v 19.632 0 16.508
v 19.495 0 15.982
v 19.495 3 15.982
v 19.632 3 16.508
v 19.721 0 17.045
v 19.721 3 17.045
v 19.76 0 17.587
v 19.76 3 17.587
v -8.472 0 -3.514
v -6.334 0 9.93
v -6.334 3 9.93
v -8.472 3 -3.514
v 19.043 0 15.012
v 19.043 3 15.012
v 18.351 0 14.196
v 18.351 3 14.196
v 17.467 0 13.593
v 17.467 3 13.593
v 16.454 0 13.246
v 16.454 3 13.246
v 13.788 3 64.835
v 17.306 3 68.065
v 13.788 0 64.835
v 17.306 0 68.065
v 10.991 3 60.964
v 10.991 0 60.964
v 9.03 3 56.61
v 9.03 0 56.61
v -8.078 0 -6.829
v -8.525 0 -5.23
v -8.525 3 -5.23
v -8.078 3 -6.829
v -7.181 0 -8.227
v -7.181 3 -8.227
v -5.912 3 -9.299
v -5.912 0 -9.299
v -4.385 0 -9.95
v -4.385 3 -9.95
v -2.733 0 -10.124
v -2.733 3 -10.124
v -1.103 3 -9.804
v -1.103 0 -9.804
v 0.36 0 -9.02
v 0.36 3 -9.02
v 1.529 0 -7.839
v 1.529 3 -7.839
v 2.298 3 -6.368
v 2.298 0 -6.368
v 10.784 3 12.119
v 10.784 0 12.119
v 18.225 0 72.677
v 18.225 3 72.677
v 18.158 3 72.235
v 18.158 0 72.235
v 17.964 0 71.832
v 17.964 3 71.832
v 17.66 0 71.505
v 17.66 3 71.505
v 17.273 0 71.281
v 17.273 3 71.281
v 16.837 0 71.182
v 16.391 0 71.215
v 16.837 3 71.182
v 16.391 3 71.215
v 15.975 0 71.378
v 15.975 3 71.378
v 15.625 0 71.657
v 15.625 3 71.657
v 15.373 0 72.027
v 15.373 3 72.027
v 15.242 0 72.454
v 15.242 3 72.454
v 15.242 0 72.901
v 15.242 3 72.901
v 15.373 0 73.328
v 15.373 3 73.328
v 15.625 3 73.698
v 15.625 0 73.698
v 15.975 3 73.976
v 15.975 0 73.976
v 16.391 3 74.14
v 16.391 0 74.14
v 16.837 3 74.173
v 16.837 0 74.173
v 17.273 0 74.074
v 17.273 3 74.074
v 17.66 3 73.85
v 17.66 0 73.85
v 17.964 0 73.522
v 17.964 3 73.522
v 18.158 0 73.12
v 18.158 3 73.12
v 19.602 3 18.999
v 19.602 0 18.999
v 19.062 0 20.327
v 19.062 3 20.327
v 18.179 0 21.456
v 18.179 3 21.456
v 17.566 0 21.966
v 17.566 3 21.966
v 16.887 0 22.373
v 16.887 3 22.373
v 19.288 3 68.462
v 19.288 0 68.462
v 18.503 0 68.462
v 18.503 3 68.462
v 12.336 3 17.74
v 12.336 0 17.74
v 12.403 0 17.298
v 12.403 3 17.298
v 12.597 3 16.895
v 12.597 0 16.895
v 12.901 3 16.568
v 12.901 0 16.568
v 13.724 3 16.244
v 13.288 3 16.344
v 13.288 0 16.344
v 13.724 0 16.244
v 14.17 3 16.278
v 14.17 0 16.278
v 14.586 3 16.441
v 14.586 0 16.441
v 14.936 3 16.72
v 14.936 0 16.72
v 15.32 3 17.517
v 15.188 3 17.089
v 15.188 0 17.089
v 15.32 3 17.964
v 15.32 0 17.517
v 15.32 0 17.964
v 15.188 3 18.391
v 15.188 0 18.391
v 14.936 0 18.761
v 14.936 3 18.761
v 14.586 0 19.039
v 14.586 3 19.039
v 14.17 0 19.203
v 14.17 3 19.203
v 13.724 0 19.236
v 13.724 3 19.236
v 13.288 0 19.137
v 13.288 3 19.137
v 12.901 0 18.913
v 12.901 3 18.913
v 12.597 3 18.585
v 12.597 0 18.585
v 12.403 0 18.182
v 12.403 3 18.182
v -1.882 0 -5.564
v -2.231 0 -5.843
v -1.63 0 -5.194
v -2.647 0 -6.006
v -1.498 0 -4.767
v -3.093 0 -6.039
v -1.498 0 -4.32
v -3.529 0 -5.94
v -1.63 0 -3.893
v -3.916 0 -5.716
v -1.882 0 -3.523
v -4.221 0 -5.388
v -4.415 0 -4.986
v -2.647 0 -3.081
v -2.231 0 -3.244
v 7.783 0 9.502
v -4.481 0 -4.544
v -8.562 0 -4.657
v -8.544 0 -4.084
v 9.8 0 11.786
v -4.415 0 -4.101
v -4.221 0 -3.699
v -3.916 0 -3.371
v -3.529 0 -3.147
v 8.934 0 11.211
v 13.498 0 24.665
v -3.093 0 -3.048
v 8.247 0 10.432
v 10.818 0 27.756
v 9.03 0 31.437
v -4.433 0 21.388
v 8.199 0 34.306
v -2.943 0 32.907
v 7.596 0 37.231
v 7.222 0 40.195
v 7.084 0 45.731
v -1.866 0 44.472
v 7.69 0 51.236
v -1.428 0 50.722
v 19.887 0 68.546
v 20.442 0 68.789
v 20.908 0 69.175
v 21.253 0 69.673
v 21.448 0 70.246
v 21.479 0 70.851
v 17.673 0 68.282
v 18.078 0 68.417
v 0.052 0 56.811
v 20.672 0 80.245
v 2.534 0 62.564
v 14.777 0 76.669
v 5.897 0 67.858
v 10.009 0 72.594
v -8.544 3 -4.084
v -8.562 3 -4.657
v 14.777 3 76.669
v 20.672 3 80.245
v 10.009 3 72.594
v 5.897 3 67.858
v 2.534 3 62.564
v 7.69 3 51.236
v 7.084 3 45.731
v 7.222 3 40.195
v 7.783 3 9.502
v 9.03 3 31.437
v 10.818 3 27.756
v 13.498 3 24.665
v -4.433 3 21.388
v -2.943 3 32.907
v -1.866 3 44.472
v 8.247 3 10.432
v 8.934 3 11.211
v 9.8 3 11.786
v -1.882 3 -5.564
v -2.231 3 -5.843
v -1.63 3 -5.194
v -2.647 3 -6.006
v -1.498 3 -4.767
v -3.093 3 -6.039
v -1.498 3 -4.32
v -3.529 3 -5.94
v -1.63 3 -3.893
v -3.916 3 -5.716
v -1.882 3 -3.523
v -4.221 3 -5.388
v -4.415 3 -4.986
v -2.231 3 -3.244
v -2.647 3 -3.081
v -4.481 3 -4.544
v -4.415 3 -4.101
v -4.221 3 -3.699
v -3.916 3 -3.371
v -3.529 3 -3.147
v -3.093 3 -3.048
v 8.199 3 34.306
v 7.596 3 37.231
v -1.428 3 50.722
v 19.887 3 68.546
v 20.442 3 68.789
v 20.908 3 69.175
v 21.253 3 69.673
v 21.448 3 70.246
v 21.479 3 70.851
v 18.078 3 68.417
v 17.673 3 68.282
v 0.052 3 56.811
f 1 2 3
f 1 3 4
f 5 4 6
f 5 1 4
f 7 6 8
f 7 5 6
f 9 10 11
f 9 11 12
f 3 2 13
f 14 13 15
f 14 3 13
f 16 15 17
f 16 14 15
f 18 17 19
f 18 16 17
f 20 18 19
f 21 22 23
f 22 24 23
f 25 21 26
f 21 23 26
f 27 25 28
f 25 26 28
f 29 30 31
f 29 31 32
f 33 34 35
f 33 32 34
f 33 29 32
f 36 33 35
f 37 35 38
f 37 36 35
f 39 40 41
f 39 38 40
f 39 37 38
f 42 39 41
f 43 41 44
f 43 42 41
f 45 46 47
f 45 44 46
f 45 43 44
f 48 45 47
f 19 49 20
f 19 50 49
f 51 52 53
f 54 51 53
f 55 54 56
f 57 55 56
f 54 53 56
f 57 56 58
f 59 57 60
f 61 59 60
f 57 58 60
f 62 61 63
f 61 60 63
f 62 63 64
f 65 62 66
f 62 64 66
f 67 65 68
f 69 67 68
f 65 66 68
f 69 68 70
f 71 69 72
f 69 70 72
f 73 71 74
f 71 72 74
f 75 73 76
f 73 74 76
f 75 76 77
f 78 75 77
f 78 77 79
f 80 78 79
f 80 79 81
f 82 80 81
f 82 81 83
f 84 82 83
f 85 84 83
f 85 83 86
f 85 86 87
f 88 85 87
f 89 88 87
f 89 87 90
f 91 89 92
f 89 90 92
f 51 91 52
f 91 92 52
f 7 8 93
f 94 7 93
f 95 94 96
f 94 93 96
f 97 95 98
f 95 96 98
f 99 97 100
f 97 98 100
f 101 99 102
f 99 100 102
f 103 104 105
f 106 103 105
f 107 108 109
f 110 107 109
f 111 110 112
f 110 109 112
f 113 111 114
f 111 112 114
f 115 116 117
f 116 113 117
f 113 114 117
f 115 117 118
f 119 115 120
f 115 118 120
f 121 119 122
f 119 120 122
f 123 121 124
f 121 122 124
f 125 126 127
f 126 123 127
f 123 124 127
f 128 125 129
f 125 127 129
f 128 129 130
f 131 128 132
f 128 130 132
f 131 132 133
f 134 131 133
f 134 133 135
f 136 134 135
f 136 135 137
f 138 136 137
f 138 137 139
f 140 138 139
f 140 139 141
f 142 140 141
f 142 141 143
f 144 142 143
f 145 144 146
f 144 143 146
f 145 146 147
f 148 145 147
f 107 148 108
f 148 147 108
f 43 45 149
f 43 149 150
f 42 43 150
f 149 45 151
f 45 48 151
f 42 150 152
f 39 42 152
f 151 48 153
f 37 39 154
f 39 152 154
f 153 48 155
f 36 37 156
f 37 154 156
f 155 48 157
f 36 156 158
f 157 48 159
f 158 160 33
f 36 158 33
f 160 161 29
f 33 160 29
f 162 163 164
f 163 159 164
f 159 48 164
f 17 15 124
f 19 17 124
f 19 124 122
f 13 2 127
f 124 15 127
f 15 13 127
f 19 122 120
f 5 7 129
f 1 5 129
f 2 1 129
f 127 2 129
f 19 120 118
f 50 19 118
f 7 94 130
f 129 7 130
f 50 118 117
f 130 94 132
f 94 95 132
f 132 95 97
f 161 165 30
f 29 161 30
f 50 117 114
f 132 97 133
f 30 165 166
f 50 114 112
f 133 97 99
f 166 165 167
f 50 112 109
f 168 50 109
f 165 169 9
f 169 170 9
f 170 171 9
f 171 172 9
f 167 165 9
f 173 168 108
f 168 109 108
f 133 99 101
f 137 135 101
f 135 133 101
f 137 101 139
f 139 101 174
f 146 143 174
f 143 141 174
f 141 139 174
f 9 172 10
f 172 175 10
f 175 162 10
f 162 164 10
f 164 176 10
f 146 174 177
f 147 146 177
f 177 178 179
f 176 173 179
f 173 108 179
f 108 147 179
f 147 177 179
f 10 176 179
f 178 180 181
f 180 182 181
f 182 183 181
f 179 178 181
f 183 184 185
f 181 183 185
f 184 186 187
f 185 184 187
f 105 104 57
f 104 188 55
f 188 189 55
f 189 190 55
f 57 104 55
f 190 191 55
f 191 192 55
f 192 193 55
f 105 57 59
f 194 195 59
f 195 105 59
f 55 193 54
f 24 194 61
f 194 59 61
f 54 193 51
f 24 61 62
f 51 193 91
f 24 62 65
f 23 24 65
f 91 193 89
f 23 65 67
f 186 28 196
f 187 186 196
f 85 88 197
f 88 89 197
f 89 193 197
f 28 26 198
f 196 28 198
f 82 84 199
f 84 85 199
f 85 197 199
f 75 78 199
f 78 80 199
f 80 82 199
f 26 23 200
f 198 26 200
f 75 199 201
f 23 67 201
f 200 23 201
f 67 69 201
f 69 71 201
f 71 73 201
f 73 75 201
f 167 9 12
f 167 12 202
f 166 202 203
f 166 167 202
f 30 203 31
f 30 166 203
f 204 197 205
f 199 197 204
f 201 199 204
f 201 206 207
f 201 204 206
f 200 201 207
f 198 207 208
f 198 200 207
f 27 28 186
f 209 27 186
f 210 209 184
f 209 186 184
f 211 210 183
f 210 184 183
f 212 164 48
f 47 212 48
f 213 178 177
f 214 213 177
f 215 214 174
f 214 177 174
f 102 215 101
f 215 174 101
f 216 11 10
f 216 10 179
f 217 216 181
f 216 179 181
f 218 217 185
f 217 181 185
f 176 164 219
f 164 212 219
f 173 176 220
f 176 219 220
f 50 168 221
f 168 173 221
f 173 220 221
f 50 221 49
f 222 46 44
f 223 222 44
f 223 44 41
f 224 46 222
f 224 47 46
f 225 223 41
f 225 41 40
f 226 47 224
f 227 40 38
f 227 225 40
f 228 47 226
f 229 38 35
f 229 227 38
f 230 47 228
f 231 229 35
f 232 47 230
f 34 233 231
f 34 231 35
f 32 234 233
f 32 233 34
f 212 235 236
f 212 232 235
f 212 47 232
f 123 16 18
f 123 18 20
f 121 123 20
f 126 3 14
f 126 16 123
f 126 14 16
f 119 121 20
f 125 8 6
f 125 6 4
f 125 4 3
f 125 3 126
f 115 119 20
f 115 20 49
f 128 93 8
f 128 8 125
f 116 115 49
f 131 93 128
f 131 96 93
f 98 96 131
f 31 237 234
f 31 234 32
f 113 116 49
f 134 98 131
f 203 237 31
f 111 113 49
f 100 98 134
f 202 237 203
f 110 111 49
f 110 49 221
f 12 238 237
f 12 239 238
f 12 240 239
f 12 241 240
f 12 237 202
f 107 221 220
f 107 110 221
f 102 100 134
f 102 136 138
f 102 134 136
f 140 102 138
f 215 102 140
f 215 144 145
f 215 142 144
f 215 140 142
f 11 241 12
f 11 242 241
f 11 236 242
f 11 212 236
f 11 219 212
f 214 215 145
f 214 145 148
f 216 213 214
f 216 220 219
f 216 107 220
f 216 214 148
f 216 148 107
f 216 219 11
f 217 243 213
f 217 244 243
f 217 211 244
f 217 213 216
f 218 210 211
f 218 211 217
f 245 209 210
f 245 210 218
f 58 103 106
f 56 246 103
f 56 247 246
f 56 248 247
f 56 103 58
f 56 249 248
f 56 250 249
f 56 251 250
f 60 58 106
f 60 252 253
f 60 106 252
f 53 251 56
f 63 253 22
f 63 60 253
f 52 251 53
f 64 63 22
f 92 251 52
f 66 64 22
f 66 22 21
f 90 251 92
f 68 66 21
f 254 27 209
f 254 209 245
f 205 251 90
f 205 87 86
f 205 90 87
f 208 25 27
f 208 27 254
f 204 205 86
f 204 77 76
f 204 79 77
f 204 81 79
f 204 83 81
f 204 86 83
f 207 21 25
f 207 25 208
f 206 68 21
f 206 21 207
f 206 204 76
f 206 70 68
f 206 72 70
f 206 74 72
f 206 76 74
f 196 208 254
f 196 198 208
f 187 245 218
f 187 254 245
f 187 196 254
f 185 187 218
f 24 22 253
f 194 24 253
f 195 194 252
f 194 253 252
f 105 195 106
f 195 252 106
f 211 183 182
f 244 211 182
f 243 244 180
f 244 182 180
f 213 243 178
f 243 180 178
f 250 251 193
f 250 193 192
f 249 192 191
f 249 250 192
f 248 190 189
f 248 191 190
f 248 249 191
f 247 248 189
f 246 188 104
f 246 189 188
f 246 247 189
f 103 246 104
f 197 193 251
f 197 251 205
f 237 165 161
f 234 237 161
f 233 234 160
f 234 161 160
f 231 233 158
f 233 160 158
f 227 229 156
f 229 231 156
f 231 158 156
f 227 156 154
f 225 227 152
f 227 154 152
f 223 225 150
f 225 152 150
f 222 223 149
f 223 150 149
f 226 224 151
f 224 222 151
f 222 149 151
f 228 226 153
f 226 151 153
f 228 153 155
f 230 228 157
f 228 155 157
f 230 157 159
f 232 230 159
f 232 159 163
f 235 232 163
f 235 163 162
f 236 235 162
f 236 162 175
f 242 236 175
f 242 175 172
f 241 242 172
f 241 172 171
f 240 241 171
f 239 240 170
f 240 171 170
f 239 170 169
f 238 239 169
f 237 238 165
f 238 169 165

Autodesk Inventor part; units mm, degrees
ref_plane "YZ Plane" through (0, 0, 0) normal (1, 0, 0) x (0, 1, 0)
ref_plane "XZ Plane" through (0, 0, 0) normal (0, 1, 0) x (-1, 0, 0)
ref_plane "XY Plane" through (0, 0, 0) normal (0, 0, 1) x (1, 0, 0)
sketch "Sketch4" plane through (0, 0, 0) normal (0, 1, 0) x (-1, 0, 0)
  arc A0 (8.5248, -5.2299) -> (8.4715, -3.5145) centre (2.5627, -4.5564) ccw
  circle A1 centre (-13.8365, 17.7403) radius 1.5
  circle A2 centre (2.9812, -4.5435) radius 1.5
  arc A3 (-18.1395, 21.8135) -> (-18.0355, 13.56) centre (-13.8365, 17.7403) ccw
  arc A4 (-9.0304, 31.4366) -> (-7.2225, 40.1949) centre (-45.2058, 43.4695) ccw
  arc A5 (-18.1395, 21.8135) -> (-9.0304, 31.4366) centre (-23.8893, 36.3791) ccw
  line L0 (6.3335, 9.9302) -> (8.4977, -3.6654)
  circle A6 centre (-16.5155, 72.4101) radius 3.2
  line L1 (-20.6719, 80.2448) -> (-14.7774, 76.6686)
  arc A7 (-2.5338, 62.5638) -> (-14.7774, 76.6686) centre (-39.7178, 42.6529) ccw
  arc A8 (1.8655, 44.4721) -> (-2.5338, 62.5638) centre (-35.3105, 45.0128) ccw
  arc A9 (1.8655, 44.4721) -> (6.3335, 9.9302) centre (325.703, 68.8005) ccw
  line L2 (-21.6848, 68.4625) -> (-20.6719, 80.2448)
  line L3 (-18.8545, 68.4625) -> (-21.6848, 68.4625)
  line L4 (-18.8545, 68.4625) -> (-17.8545, 68.4625)
  arc A10 (-9.0296, 56.61) -> (-17.8545, 68.4625) centre (-31.443, 49.1333) ccw
  arc A11 (-7.2225, 40.1949) -> (-9.0296, 56.61) centre (-48.1916, 43.9919) ccw
  line L5 (-8.5324, 11.672) -> (-2.2983, -6.3679)
  line L6 (-8.5324, 11.672) -> (-18.0355, 13.56)
  arc A12 (8.4977, -3.6654) -> (8.4715, -3.5145) centre (2.9812, -4.5435) ccw
  arc A13 (-2.2983, -6.3679) -> (8.5248, -5.2299) centre (2.9812, -4.5435) ccw
  arc A14 (8.4977, -3.6654) -> (8.4715, -3.5145) centre (2.9812, -4.5435) ccw
  point P0 (0, 0)
  point P1 (-5.4967, 17.4778)
  point P2 (-7.3422, 22.2297)
  point P3 (-8.8923, 40.8853)
  point P4 (7.4044, -1.132)
  point P5 (0, 0)
  dimension "d11" = 3
  dimension "d23" = 6.4
extrude "Extrusion4" add sketch "Sketch4" along normal blind 3 contours A13 L5 L6 A3 A5 A4 A11 A10 L4 L3 L2 L1 A7 A8 A9 L0 A0 | A6
fillet "Fillet5" radius 5.2 1 edges at (18.1395, 1.5, 21.8135)
fillet "Fillet6" radius 2 1 edges at (17.8545, 1.5, 68.4625)
fillet "Fillet8" radius 2.2 1 edges at (21.6848, 1.5, 68.4625)
sketch "Sketch7" plane through (0, 3, 0) normal (0, 1, 0) x (1, 0, 0)
  circle A0 centre (16.7249, -72.6774) radius 1.5
  dimension "d31" = 3
extrude "Extrusion7" cut sketch "Sketch7" against normal through all
fillet "Fillet9" radius 4 1 edges at (18.0355, 1.5, 13.56)
fillet "Fillet10" radius 4 1 edges at (8.5324, 1.5, 11.672)
properties part number "claw2" material "ABS Plastic"
